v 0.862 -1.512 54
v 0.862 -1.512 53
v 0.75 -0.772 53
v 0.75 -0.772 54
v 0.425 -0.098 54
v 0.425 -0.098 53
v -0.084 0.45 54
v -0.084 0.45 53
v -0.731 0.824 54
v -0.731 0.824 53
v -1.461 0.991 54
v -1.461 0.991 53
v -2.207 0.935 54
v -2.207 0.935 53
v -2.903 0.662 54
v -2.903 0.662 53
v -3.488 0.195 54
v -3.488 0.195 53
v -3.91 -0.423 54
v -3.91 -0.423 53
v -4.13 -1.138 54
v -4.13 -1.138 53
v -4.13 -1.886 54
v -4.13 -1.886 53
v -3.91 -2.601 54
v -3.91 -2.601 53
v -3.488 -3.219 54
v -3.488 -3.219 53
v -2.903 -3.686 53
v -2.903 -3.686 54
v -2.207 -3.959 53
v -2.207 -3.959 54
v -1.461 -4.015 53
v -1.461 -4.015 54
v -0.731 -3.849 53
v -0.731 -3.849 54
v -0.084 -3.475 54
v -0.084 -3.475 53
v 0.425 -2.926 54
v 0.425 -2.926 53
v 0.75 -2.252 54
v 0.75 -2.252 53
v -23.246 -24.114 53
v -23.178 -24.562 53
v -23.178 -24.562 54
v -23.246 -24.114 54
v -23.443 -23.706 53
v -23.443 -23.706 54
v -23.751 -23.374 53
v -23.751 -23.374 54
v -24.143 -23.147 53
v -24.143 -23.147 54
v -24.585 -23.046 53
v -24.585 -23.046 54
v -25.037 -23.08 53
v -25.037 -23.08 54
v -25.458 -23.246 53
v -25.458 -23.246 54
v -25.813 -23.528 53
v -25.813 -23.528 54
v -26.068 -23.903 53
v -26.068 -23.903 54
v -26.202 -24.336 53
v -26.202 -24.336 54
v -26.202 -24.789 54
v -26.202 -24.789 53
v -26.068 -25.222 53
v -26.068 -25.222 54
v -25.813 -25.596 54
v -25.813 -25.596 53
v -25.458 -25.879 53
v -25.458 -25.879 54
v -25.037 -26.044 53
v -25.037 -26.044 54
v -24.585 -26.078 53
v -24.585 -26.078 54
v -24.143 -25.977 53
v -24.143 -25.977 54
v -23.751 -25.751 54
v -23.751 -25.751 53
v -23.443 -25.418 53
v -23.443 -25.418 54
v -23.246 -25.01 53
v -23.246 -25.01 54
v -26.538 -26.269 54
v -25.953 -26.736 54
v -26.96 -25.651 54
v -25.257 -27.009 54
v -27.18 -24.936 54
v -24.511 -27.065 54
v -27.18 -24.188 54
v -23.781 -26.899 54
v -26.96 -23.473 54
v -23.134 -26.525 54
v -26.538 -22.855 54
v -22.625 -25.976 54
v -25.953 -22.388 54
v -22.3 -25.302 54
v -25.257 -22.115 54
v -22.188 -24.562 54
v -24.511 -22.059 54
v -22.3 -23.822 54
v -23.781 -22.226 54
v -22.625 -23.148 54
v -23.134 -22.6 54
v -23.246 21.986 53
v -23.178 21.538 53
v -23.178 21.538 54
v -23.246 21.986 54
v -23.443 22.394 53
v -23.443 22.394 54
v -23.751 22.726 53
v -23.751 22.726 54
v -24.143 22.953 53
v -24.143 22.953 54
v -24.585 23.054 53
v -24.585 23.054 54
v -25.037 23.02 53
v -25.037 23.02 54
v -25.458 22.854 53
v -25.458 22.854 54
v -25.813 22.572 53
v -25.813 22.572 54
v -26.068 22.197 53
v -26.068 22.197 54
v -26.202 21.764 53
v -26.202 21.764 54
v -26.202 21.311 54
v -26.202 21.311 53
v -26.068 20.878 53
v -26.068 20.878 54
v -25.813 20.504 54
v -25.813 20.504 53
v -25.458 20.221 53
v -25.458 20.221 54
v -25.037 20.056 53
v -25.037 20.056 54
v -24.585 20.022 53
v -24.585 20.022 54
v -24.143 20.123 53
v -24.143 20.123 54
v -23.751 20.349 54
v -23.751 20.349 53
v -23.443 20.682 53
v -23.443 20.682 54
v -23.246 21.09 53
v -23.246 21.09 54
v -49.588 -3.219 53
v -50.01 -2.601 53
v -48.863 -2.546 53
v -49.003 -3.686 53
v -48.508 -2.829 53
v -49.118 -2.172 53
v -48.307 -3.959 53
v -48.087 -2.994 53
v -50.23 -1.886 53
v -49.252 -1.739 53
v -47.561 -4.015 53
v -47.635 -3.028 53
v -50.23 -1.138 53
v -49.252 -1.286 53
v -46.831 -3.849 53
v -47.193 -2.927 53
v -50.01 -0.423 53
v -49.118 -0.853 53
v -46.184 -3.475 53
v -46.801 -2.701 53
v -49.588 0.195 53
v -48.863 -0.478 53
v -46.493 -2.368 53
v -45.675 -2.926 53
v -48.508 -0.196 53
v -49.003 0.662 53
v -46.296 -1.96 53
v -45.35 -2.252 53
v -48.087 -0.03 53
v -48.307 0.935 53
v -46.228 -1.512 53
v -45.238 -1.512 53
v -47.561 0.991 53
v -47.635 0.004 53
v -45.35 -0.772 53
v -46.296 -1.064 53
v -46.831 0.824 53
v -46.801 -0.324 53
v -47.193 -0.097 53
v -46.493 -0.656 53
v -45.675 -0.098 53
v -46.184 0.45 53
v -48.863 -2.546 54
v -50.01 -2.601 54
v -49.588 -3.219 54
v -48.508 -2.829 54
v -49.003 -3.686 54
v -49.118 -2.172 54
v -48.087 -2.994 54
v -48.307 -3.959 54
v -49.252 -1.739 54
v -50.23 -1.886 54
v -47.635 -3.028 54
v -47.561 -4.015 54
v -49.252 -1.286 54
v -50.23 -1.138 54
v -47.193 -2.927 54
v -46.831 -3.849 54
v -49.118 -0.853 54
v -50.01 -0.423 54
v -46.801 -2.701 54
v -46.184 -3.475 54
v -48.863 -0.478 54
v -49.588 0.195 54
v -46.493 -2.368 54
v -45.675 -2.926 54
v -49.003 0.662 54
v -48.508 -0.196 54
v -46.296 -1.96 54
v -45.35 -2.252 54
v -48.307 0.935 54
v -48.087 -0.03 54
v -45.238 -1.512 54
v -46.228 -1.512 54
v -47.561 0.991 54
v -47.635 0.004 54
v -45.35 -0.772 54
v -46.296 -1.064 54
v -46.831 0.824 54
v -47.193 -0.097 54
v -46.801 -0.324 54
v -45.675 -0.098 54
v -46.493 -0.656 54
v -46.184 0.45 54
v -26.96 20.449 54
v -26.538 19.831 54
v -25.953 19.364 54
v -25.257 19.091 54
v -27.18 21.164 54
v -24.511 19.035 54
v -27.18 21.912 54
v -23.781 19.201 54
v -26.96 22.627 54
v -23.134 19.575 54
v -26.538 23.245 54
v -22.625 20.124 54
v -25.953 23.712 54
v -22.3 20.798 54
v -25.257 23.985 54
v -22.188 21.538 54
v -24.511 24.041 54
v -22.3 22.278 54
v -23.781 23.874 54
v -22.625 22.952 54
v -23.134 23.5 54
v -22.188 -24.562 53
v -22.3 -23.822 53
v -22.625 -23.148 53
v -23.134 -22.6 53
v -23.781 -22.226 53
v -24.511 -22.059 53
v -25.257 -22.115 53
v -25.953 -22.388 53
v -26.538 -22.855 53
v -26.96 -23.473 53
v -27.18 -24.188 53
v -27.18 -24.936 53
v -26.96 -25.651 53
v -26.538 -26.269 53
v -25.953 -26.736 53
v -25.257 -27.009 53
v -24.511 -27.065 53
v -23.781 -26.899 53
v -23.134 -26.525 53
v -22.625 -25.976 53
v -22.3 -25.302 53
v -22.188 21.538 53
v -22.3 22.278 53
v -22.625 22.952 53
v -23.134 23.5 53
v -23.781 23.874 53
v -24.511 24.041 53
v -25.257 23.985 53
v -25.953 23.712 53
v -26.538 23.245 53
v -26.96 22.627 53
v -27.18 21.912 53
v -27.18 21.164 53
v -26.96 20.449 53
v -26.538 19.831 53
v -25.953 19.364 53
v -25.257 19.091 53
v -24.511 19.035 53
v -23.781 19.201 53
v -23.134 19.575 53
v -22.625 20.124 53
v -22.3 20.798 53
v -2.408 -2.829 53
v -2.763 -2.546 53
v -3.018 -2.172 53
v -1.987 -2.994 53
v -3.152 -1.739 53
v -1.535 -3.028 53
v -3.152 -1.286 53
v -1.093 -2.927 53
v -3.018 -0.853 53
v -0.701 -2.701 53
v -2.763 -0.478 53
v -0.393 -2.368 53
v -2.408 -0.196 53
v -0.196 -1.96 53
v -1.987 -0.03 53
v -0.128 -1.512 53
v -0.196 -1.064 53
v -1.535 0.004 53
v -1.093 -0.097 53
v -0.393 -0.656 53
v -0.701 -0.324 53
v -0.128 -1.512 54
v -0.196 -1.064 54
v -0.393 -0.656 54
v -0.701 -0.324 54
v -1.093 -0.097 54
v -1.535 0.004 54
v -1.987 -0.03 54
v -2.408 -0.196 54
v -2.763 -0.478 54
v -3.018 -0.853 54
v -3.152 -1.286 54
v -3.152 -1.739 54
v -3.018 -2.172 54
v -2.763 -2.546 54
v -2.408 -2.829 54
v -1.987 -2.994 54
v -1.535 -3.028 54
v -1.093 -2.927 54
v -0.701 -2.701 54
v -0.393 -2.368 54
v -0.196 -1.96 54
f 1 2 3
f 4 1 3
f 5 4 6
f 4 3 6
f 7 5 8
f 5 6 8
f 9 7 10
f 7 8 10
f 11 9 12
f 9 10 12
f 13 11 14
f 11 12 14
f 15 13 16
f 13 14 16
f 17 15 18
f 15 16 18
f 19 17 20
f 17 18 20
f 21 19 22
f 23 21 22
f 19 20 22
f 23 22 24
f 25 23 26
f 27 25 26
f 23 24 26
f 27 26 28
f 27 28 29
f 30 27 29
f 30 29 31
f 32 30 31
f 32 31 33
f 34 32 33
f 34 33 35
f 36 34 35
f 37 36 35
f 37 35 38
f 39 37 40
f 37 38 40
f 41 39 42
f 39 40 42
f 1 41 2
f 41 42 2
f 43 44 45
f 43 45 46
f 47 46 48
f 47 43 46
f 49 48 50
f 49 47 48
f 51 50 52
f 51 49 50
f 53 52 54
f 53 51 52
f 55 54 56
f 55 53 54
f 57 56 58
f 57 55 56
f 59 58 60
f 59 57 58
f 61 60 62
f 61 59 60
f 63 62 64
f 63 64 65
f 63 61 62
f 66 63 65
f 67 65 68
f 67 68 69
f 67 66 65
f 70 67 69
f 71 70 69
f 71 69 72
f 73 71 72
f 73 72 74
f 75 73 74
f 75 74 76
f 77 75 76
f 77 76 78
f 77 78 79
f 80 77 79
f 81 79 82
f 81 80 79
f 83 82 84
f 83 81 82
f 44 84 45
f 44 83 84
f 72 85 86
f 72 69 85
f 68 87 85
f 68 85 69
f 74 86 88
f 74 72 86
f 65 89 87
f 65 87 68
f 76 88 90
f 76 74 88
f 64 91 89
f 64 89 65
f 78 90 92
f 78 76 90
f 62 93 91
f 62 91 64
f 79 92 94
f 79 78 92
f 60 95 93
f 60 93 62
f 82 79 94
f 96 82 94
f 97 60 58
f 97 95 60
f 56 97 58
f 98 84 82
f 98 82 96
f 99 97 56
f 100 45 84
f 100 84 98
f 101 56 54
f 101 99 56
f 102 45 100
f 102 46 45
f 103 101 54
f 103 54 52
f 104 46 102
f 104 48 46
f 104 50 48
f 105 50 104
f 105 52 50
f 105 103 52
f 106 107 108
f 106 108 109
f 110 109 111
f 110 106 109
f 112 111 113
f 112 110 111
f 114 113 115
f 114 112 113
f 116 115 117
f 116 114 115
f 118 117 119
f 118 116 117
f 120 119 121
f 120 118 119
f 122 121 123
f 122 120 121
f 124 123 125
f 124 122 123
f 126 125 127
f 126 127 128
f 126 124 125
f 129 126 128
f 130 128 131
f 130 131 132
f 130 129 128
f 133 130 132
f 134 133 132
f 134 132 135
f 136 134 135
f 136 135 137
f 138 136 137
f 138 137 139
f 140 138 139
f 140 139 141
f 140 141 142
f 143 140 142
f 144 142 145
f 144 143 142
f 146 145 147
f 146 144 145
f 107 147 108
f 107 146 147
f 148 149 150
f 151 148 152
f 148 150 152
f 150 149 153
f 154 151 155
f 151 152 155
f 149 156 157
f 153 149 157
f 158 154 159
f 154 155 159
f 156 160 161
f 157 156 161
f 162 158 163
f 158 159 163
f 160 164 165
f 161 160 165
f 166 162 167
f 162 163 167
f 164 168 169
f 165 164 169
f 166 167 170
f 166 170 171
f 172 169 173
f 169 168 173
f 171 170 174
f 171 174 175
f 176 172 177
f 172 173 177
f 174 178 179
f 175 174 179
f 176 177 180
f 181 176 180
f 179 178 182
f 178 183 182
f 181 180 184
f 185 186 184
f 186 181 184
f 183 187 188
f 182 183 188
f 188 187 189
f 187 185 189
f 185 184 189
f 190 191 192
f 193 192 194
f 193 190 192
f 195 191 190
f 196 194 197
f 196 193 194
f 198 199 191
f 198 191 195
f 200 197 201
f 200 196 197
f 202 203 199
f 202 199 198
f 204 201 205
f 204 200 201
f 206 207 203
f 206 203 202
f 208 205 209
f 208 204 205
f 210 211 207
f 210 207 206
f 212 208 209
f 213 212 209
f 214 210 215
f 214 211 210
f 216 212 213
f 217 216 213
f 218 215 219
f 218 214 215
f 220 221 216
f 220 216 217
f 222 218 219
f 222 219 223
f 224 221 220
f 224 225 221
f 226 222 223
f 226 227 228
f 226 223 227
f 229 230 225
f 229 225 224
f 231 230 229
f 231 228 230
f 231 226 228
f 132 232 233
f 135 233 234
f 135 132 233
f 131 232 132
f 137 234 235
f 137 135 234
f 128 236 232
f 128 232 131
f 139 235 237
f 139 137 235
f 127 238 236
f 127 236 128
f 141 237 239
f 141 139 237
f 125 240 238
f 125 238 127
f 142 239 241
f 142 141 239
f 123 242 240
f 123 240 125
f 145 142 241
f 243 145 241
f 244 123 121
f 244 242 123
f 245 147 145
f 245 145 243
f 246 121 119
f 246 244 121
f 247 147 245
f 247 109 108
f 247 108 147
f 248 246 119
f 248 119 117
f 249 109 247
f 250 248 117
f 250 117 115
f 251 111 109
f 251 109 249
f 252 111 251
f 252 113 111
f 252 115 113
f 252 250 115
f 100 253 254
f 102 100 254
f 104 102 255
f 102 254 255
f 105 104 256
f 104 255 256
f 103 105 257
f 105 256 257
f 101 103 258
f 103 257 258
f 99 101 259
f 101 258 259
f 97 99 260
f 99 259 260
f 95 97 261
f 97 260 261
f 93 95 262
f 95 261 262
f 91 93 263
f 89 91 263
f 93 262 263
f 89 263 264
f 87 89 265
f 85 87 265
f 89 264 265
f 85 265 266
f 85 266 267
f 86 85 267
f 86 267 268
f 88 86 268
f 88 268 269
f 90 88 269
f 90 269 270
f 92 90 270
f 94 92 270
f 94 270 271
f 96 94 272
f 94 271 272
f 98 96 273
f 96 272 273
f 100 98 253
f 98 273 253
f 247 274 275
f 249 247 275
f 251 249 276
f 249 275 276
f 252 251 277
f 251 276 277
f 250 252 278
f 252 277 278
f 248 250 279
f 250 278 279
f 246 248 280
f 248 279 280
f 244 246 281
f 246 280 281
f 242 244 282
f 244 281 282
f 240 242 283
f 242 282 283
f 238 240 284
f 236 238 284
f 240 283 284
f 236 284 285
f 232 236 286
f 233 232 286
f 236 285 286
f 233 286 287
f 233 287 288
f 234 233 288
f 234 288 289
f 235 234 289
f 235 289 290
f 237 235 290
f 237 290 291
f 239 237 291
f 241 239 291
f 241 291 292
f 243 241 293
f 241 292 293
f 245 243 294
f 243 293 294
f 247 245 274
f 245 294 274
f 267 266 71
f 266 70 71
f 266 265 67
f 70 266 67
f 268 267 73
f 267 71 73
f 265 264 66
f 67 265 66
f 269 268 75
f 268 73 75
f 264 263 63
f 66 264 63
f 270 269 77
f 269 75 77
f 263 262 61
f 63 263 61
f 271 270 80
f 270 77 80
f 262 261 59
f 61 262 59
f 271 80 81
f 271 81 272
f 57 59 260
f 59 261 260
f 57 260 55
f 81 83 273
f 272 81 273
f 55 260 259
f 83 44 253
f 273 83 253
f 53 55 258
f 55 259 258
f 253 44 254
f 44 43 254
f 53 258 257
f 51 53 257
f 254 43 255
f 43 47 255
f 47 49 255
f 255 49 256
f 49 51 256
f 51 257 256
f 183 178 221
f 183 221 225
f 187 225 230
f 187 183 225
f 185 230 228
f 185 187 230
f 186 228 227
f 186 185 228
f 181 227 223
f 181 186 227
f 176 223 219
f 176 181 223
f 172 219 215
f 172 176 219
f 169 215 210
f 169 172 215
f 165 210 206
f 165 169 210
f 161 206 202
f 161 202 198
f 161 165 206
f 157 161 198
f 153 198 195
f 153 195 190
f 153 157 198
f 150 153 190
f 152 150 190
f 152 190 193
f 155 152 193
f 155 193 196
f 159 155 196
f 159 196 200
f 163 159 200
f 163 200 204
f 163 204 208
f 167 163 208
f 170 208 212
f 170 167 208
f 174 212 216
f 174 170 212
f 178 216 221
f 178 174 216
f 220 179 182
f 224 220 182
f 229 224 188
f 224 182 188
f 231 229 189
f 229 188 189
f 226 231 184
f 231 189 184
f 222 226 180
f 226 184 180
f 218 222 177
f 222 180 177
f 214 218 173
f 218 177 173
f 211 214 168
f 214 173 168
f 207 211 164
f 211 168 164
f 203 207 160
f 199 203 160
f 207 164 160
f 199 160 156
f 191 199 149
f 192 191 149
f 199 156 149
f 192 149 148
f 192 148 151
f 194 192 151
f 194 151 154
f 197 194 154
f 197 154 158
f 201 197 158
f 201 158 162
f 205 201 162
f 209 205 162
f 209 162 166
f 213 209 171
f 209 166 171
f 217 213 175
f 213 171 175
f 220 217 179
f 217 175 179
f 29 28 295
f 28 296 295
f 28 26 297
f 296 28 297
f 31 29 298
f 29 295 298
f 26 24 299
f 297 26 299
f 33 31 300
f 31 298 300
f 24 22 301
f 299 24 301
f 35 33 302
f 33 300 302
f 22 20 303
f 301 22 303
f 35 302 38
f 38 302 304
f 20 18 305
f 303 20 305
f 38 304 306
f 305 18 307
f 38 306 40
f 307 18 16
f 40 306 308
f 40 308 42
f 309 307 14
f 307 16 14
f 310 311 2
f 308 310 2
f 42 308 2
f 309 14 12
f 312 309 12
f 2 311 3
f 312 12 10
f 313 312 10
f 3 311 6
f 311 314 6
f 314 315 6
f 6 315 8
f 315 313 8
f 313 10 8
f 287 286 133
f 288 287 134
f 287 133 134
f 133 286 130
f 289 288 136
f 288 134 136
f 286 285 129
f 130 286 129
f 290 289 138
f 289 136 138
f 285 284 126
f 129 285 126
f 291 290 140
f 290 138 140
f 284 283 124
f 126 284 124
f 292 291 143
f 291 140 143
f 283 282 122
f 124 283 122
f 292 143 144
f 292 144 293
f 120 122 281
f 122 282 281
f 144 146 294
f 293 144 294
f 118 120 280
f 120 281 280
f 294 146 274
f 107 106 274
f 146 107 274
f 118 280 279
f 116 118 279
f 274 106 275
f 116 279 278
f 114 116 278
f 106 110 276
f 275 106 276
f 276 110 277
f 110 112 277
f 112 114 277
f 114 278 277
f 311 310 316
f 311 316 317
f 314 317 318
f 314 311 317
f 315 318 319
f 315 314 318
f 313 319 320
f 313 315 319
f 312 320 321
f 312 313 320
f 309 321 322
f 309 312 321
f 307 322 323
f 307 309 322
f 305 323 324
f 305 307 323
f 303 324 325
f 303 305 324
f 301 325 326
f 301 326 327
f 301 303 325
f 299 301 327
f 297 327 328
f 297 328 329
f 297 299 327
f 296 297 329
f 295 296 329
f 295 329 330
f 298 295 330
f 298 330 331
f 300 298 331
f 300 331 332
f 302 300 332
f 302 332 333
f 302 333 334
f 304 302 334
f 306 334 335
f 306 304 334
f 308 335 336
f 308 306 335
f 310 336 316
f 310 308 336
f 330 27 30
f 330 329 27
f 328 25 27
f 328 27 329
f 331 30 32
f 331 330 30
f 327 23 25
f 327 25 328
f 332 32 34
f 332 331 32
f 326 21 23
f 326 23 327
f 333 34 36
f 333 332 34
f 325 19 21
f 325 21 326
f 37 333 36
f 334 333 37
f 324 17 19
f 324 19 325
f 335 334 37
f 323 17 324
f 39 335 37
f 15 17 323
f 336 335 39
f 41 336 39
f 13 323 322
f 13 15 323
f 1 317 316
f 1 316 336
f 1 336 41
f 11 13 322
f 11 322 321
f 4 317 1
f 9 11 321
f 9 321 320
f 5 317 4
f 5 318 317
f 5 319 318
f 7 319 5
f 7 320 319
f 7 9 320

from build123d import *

# Parameters (mm, degrees)
SKETCH_1_R        = 2.51
SKETCH_1_R_2      = 1.52
EXTRUDE_1_DEPTH   = 1
EXTRUDE_1_2_DEPTH = 1
EXTRUDE_1_3_DEPTH = 1
EXTRUDE_1_4_DEPTH = 1


with BuildPart() as part:
    # 草图1 → 凸台-拉伸1 (new body)
    with BuildSketch(Plane.XY.offset(53)):
        with Locations((-24.698490112, 21.537847164)):
            Circle(SKETCH_1_R)
        with Locations((-24.698490112, 21.537847164)):
            Circle(SKETCH_1_R_2, mode=Mode.SUBTRACT)
    extrude(amount=EXTRUDE_1_DEPTH)


with BuildPart() as body_2:
    # 草图1 → Extrude 1 2 (new body)
    with BuildSketch(Plane.XY.offset(53)):
        with Locations((-1.648490492, -1.512152456)):
            Circle(SKETCH_1_R)
        with Locations((-1.648490492, -1.512152456)):
            Circle(SKETCH_1_R_2, mode=Mode.SUBTRACT)
    extrude(amount=EXTRUDE_1_2_DEPTH)


with BuildPart() as body_3:
    # 草图1 → Extrude 1 3 (new body)
    with BuildSketch(Plane.XY.offset(53)):
        with Locations((-24.698490112, -24.562152076)):
            Circle(SKETCH_1_R)
        with Locations((-24.698490112, -24.562152076)):
            Circle(SKETCH_1_R_2, mode=Mode.SUBTRACT)
    extrude(amount=EXTRUDE_1_3_DEPTH)


with BuildPart() as body_4:
    # 草图1 → Extrude 1 4 (new body)
    with BuildSketch(Plane.XY.offset(53)):
        with Locations((-47.748489732, -1.512152456)):
            Circle(SKETCH_1_R)
        with Locations((-47.748489732, -1.512152456)):
            Circle(SKETCH_1_R_2, mode=Mode.SUBTRACT)
    extrude(amount=EXTRUDE_1_4_DEPTH)


solid = Compound([part.part, body_2.part, body_3.part, body_4.part])
